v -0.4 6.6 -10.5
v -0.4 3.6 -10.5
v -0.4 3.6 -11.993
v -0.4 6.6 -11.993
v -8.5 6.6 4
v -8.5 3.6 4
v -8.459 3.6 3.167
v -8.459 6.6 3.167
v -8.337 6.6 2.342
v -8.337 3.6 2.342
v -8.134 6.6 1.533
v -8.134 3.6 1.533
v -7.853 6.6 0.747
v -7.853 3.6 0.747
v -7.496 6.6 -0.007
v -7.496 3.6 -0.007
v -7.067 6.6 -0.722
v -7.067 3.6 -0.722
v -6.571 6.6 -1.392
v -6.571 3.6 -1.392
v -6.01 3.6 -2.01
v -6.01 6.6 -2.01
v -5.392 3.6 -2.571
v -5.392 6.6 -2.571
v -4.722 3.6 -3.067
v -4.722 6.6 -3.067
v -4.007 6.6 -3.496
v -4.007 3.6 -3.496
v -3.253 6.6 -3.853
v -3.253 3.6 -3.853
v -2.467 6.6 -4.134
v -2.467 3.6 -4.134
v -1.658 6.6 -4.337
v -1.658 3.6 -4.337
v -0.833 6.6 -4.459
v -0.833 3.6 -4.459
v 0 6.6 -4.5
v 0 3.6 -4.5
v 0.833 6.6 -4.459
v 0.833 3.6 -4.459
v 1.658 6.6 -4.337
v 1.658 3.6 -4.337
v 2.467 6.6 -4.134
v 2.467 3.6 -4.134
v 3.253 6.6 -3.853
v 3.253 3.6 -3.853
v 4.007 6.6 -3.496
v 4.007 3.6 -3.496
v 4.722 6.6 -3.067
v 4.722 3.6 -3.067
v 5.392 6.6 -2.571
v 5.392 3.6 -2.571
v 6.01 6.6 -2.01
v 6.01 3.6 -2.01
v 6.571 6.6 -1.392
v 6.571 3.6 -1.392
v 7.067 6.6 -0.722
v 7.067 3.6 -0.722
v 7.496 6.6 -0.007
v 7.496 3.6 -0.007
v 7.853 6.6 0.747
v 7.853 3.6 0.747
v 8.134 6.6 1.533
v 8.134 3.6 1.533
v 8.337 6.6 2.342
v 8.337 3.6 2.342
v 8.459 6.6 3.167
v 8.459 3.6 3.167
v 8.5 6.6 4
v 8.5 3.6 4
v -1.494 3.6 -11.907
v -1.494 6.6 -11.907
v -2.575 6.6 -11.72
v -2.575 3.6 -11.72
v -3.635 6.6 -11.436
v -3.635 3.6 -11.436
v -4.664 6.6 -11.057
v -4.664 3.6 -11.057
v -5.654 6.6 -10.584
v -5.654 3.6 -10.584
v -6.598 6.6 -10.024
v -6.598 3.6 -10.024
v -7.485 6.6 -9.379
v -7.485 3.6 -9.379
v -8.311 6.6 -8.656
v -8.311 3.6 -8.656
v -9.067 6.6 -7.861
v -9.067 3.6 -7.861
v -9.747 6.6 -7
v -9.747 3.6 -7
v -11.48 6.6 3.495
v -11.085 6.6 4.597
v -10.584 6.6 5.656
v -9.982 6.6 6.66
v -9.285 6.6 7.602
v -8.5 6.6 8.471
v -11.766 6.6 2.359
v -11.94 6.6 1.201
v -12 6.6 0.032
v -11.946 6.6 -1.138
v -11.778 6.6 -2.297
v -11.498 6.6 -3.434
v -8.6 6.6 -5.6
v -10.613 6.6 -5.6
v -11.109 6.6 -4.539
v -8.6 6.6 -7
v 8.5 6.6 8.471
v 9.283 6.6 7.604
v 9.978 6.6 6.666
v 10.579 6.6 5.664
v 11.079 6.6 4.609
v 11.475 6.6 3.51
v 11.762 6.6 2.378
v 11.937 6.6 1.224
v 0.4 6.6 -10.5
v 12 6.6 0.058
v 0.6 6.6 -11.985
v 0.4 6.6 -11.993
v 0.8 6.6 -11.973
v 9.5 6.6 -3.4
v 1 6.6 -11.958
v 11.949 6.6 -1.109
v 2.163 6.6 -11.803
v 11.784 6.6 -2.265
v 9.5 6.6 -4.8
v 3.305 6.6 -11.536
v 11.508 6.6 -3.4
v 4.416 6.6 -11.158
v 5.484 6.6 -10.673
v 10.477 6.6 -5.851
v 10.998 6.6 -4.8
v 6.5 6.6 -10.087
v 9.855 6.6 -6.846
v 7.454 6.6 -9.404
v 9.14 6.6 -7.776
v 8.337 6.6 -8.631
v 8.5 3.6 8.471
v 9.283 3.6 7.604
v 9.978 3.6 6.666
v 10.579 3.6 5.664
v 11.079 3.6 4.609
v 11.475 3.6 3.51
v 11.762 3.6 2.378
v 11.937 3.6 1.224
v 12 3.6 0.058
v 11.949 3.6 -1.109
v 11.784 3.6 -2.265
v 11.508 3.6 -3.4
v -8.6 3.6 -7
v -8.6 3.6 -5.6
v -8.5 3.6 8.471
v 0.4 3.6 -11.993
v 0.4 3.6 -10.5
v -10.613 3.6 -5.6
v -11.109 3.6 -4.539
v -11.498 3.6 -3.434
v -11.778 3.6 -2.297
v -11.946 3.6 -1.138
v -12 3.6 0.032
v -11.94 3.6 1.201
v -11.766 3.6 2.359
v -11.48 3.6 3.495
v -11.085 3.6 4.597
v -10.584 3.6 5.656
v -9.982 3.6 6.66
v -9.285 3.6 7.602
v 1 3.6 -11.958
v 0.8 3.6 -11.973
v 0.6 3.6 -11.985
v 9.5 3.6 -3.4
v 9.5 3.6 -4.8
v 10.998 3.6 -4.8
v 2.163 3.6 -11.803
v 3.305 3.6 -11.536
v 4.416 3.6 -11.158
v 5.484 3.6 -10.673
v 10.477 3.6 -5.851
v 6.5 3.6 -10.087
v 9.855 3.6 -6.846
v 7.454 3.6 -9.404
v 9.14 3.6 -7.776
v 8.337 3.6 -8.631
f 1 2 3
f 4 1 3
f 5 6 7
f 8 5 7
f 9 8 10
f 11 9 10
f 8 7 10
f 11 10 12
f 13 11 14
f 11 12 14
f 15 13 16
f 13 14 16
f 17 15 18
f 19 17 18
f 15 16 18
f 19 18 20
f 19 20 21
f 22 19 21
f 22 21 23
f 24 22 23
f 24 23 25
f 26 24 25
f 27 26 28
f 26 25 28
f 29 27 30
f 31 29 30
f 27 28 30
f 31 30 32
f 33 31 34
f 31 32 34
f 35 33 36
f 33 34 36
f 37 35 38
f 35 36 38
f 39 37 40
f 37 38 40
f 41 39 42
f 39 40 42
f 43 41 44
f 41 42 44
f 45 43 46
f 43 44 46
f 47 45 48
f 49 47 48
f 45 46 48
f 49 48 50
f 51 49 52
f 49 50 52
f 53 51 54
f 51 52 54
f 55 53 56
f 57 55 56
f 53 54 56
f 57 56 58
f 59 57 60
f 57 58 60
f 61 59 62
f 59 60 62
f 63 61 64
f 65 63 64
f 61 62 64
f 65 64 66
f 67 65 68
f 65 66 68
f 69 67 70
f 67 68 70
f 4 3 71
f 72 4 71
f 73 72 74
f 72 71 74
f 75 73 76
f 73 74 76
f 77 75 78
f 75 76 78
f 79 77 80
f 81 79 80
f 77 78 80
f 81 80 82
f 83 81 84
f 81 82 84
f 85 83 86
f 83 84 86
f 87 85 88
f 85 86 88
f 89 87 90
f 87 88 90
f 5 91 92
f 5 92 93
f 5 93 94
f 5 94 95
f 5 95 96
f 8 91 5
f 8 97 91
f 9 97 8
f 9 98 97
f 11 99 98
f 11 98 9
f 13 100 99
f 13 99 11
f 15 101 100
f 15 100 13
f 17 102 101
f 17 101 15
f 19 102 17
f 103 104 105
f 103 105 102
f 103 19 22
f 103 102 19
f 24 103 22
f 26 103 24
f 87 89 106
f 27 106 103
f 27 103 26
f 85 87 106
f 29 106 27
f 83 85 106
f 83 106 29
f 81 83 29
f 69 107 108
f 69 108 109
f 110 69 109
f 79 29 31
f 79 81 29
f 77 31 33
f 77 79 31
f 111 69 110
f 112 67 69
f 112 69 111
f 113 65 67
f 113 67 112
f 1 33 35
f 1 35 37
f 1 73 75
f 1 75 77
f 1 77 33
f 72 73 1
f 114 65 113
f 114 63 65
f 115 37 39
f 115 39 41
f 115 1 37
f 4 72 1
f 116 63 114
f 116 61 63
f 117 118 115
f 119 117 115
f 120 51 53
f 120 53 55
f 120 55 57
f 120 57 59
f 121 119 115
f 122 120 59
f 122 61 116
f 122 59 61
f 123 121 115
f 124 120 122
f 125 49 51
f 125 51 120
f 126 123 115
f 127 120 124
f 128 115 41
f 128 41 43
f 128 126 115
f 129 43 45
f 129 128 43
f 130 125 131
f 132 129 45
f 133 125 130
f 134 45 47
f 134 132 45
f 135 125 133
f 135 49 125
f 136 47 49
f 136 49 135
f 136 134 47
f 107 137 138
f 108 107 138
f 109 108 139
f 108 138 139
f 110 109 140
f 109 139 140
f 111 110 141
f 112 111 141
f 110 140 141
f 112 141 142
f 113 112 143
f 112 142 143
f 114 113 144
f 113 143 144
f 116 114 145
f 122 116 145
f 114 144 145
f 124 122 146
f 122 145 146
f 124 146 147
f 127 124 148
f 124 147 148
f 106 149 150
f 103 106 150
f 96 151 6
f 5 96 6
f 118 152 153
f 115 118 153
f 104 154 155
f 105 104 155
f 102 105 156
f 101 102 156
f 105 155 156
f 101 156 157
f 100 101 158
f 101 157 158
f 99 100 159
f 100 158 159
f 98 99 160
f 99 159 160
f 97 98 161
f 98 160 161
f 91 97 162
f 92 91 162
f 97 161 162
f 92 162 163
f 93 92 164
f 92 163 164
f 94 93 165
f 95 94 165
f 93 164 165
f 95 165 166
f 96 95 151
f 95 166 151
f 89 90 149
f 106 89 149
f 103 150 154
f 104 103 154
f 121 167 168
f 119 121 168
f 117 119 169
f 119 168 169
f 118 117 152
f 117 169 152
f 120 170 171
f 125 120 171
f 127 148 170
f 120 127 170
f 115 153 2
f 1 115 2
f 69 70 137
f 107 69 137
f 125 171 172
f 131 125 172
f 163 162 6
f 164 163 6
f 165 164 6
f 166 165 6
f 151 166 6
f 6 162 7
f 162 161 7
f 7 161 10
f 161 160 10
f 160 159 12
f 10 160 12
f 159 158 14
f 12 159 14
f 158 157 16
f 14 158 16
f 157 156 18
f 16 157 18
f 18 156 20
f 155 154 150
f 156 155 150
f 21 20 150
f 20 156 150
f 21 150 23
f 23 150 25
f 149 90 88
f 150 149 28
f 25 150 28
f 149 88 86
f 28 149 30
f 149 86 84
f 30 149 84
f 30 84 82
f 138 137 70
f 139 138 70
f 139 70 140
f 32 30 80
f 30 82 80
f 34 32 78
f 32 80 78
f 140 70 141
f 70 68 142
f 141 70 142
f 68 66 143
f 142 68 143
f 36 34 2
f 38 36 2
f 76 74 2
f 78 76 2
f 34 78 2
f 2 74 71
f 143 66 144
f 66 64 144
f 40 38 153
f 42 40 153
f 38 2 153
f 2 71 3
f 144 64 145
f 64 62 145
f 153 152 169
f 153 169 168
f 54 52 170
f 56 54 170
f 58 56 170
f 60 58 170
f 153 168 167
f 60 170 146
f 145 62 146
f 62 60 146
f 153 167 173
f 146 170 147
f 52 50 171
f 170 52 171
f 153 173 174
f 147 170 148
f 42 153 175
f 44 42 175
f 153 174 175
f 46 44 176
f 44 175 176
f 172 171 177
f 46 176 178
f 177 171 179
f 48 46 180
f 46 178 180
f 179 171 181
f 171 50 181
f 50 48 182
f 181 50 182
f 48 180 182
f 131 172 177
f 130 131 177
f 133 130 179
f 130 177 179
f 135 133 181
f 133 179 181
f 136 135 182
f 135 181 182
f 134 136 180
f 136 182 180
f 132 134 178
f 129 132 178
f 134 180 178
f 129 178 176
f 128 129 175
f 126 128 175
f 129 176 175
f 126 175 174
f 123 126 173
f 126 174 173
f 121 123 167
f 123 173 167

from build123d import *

# Parameters (mm, degrees)
BOSS_EXTRUDE1_DEPTH = 3


with BuildPart() as part:
    # Sketch1 → Boss-Extrude1 (new body)
    with BuildSketch(Plane(origin=(0, 3.6, 0), x_dir=(1, 0, 0), z_dir=(0, 1, 0))):
        with BuildLine():
            Line((-8.6, 7), (-8.6, 5.6))
            Line((-8.6, 5.6), (-10.613199329, 5.6))
            ThreePointArc((-10.613199329, 5.6), (-11.866912034, -1.782245428), (-8.5, -8.470537173))
            Line((-8.5, -8.470537173), (-8.5, -4))
            ThreePointArc((-8.5, -4), (0, 4.5), (8.5, -4))
            Line((8.5, -4), (8.5, -8.470537173))
            ThreePointArc((8.5, -8.470537173), (11.632283064, -2.947879019), (11.508257905, 3.4))
            Line((11.508257905, 3.4), (9.5, 3.4))
            Line((9.5, 3.4), (9.5, 4.8))
            Line((9.5, 4.8), (10.998181668, 4.8))
            ThreePointArc((10.998181668, 4.8), (6.985647075, 9.757086397), (1, 11.958260743))
            Line((1, 11.958260743), (1, 10.5))
            Line((1, 10.5), (0.4, 10.5))
            Line((0.4, 10.5), (-0.4, 10.5))
            Line((-0.4, 10.5), (-0.4, 11.99333148))
            ThreePointArc((-0.4, 11.99333148), (-5.654440617, 10.584295031), (-9.746794345, 7))
            Line((-9.746794345, 7), (-8.6, 7))
        make_face()
        with BuildLine():
            Line((0.4, 11.99333148), (0.4, 10.5))
            Line((0.4, 10.5), (1, 10.5))
            Line((1, 10.5), (1, 11.958260743))
            ThreePointArc((1, 11.958260743), (0.700219601, 11.979553101), (0.4, 11.99333148))
        make_face()
    extrude(amount=BOSS_EXTRUDE1_DEPTH)


solid = part.part
